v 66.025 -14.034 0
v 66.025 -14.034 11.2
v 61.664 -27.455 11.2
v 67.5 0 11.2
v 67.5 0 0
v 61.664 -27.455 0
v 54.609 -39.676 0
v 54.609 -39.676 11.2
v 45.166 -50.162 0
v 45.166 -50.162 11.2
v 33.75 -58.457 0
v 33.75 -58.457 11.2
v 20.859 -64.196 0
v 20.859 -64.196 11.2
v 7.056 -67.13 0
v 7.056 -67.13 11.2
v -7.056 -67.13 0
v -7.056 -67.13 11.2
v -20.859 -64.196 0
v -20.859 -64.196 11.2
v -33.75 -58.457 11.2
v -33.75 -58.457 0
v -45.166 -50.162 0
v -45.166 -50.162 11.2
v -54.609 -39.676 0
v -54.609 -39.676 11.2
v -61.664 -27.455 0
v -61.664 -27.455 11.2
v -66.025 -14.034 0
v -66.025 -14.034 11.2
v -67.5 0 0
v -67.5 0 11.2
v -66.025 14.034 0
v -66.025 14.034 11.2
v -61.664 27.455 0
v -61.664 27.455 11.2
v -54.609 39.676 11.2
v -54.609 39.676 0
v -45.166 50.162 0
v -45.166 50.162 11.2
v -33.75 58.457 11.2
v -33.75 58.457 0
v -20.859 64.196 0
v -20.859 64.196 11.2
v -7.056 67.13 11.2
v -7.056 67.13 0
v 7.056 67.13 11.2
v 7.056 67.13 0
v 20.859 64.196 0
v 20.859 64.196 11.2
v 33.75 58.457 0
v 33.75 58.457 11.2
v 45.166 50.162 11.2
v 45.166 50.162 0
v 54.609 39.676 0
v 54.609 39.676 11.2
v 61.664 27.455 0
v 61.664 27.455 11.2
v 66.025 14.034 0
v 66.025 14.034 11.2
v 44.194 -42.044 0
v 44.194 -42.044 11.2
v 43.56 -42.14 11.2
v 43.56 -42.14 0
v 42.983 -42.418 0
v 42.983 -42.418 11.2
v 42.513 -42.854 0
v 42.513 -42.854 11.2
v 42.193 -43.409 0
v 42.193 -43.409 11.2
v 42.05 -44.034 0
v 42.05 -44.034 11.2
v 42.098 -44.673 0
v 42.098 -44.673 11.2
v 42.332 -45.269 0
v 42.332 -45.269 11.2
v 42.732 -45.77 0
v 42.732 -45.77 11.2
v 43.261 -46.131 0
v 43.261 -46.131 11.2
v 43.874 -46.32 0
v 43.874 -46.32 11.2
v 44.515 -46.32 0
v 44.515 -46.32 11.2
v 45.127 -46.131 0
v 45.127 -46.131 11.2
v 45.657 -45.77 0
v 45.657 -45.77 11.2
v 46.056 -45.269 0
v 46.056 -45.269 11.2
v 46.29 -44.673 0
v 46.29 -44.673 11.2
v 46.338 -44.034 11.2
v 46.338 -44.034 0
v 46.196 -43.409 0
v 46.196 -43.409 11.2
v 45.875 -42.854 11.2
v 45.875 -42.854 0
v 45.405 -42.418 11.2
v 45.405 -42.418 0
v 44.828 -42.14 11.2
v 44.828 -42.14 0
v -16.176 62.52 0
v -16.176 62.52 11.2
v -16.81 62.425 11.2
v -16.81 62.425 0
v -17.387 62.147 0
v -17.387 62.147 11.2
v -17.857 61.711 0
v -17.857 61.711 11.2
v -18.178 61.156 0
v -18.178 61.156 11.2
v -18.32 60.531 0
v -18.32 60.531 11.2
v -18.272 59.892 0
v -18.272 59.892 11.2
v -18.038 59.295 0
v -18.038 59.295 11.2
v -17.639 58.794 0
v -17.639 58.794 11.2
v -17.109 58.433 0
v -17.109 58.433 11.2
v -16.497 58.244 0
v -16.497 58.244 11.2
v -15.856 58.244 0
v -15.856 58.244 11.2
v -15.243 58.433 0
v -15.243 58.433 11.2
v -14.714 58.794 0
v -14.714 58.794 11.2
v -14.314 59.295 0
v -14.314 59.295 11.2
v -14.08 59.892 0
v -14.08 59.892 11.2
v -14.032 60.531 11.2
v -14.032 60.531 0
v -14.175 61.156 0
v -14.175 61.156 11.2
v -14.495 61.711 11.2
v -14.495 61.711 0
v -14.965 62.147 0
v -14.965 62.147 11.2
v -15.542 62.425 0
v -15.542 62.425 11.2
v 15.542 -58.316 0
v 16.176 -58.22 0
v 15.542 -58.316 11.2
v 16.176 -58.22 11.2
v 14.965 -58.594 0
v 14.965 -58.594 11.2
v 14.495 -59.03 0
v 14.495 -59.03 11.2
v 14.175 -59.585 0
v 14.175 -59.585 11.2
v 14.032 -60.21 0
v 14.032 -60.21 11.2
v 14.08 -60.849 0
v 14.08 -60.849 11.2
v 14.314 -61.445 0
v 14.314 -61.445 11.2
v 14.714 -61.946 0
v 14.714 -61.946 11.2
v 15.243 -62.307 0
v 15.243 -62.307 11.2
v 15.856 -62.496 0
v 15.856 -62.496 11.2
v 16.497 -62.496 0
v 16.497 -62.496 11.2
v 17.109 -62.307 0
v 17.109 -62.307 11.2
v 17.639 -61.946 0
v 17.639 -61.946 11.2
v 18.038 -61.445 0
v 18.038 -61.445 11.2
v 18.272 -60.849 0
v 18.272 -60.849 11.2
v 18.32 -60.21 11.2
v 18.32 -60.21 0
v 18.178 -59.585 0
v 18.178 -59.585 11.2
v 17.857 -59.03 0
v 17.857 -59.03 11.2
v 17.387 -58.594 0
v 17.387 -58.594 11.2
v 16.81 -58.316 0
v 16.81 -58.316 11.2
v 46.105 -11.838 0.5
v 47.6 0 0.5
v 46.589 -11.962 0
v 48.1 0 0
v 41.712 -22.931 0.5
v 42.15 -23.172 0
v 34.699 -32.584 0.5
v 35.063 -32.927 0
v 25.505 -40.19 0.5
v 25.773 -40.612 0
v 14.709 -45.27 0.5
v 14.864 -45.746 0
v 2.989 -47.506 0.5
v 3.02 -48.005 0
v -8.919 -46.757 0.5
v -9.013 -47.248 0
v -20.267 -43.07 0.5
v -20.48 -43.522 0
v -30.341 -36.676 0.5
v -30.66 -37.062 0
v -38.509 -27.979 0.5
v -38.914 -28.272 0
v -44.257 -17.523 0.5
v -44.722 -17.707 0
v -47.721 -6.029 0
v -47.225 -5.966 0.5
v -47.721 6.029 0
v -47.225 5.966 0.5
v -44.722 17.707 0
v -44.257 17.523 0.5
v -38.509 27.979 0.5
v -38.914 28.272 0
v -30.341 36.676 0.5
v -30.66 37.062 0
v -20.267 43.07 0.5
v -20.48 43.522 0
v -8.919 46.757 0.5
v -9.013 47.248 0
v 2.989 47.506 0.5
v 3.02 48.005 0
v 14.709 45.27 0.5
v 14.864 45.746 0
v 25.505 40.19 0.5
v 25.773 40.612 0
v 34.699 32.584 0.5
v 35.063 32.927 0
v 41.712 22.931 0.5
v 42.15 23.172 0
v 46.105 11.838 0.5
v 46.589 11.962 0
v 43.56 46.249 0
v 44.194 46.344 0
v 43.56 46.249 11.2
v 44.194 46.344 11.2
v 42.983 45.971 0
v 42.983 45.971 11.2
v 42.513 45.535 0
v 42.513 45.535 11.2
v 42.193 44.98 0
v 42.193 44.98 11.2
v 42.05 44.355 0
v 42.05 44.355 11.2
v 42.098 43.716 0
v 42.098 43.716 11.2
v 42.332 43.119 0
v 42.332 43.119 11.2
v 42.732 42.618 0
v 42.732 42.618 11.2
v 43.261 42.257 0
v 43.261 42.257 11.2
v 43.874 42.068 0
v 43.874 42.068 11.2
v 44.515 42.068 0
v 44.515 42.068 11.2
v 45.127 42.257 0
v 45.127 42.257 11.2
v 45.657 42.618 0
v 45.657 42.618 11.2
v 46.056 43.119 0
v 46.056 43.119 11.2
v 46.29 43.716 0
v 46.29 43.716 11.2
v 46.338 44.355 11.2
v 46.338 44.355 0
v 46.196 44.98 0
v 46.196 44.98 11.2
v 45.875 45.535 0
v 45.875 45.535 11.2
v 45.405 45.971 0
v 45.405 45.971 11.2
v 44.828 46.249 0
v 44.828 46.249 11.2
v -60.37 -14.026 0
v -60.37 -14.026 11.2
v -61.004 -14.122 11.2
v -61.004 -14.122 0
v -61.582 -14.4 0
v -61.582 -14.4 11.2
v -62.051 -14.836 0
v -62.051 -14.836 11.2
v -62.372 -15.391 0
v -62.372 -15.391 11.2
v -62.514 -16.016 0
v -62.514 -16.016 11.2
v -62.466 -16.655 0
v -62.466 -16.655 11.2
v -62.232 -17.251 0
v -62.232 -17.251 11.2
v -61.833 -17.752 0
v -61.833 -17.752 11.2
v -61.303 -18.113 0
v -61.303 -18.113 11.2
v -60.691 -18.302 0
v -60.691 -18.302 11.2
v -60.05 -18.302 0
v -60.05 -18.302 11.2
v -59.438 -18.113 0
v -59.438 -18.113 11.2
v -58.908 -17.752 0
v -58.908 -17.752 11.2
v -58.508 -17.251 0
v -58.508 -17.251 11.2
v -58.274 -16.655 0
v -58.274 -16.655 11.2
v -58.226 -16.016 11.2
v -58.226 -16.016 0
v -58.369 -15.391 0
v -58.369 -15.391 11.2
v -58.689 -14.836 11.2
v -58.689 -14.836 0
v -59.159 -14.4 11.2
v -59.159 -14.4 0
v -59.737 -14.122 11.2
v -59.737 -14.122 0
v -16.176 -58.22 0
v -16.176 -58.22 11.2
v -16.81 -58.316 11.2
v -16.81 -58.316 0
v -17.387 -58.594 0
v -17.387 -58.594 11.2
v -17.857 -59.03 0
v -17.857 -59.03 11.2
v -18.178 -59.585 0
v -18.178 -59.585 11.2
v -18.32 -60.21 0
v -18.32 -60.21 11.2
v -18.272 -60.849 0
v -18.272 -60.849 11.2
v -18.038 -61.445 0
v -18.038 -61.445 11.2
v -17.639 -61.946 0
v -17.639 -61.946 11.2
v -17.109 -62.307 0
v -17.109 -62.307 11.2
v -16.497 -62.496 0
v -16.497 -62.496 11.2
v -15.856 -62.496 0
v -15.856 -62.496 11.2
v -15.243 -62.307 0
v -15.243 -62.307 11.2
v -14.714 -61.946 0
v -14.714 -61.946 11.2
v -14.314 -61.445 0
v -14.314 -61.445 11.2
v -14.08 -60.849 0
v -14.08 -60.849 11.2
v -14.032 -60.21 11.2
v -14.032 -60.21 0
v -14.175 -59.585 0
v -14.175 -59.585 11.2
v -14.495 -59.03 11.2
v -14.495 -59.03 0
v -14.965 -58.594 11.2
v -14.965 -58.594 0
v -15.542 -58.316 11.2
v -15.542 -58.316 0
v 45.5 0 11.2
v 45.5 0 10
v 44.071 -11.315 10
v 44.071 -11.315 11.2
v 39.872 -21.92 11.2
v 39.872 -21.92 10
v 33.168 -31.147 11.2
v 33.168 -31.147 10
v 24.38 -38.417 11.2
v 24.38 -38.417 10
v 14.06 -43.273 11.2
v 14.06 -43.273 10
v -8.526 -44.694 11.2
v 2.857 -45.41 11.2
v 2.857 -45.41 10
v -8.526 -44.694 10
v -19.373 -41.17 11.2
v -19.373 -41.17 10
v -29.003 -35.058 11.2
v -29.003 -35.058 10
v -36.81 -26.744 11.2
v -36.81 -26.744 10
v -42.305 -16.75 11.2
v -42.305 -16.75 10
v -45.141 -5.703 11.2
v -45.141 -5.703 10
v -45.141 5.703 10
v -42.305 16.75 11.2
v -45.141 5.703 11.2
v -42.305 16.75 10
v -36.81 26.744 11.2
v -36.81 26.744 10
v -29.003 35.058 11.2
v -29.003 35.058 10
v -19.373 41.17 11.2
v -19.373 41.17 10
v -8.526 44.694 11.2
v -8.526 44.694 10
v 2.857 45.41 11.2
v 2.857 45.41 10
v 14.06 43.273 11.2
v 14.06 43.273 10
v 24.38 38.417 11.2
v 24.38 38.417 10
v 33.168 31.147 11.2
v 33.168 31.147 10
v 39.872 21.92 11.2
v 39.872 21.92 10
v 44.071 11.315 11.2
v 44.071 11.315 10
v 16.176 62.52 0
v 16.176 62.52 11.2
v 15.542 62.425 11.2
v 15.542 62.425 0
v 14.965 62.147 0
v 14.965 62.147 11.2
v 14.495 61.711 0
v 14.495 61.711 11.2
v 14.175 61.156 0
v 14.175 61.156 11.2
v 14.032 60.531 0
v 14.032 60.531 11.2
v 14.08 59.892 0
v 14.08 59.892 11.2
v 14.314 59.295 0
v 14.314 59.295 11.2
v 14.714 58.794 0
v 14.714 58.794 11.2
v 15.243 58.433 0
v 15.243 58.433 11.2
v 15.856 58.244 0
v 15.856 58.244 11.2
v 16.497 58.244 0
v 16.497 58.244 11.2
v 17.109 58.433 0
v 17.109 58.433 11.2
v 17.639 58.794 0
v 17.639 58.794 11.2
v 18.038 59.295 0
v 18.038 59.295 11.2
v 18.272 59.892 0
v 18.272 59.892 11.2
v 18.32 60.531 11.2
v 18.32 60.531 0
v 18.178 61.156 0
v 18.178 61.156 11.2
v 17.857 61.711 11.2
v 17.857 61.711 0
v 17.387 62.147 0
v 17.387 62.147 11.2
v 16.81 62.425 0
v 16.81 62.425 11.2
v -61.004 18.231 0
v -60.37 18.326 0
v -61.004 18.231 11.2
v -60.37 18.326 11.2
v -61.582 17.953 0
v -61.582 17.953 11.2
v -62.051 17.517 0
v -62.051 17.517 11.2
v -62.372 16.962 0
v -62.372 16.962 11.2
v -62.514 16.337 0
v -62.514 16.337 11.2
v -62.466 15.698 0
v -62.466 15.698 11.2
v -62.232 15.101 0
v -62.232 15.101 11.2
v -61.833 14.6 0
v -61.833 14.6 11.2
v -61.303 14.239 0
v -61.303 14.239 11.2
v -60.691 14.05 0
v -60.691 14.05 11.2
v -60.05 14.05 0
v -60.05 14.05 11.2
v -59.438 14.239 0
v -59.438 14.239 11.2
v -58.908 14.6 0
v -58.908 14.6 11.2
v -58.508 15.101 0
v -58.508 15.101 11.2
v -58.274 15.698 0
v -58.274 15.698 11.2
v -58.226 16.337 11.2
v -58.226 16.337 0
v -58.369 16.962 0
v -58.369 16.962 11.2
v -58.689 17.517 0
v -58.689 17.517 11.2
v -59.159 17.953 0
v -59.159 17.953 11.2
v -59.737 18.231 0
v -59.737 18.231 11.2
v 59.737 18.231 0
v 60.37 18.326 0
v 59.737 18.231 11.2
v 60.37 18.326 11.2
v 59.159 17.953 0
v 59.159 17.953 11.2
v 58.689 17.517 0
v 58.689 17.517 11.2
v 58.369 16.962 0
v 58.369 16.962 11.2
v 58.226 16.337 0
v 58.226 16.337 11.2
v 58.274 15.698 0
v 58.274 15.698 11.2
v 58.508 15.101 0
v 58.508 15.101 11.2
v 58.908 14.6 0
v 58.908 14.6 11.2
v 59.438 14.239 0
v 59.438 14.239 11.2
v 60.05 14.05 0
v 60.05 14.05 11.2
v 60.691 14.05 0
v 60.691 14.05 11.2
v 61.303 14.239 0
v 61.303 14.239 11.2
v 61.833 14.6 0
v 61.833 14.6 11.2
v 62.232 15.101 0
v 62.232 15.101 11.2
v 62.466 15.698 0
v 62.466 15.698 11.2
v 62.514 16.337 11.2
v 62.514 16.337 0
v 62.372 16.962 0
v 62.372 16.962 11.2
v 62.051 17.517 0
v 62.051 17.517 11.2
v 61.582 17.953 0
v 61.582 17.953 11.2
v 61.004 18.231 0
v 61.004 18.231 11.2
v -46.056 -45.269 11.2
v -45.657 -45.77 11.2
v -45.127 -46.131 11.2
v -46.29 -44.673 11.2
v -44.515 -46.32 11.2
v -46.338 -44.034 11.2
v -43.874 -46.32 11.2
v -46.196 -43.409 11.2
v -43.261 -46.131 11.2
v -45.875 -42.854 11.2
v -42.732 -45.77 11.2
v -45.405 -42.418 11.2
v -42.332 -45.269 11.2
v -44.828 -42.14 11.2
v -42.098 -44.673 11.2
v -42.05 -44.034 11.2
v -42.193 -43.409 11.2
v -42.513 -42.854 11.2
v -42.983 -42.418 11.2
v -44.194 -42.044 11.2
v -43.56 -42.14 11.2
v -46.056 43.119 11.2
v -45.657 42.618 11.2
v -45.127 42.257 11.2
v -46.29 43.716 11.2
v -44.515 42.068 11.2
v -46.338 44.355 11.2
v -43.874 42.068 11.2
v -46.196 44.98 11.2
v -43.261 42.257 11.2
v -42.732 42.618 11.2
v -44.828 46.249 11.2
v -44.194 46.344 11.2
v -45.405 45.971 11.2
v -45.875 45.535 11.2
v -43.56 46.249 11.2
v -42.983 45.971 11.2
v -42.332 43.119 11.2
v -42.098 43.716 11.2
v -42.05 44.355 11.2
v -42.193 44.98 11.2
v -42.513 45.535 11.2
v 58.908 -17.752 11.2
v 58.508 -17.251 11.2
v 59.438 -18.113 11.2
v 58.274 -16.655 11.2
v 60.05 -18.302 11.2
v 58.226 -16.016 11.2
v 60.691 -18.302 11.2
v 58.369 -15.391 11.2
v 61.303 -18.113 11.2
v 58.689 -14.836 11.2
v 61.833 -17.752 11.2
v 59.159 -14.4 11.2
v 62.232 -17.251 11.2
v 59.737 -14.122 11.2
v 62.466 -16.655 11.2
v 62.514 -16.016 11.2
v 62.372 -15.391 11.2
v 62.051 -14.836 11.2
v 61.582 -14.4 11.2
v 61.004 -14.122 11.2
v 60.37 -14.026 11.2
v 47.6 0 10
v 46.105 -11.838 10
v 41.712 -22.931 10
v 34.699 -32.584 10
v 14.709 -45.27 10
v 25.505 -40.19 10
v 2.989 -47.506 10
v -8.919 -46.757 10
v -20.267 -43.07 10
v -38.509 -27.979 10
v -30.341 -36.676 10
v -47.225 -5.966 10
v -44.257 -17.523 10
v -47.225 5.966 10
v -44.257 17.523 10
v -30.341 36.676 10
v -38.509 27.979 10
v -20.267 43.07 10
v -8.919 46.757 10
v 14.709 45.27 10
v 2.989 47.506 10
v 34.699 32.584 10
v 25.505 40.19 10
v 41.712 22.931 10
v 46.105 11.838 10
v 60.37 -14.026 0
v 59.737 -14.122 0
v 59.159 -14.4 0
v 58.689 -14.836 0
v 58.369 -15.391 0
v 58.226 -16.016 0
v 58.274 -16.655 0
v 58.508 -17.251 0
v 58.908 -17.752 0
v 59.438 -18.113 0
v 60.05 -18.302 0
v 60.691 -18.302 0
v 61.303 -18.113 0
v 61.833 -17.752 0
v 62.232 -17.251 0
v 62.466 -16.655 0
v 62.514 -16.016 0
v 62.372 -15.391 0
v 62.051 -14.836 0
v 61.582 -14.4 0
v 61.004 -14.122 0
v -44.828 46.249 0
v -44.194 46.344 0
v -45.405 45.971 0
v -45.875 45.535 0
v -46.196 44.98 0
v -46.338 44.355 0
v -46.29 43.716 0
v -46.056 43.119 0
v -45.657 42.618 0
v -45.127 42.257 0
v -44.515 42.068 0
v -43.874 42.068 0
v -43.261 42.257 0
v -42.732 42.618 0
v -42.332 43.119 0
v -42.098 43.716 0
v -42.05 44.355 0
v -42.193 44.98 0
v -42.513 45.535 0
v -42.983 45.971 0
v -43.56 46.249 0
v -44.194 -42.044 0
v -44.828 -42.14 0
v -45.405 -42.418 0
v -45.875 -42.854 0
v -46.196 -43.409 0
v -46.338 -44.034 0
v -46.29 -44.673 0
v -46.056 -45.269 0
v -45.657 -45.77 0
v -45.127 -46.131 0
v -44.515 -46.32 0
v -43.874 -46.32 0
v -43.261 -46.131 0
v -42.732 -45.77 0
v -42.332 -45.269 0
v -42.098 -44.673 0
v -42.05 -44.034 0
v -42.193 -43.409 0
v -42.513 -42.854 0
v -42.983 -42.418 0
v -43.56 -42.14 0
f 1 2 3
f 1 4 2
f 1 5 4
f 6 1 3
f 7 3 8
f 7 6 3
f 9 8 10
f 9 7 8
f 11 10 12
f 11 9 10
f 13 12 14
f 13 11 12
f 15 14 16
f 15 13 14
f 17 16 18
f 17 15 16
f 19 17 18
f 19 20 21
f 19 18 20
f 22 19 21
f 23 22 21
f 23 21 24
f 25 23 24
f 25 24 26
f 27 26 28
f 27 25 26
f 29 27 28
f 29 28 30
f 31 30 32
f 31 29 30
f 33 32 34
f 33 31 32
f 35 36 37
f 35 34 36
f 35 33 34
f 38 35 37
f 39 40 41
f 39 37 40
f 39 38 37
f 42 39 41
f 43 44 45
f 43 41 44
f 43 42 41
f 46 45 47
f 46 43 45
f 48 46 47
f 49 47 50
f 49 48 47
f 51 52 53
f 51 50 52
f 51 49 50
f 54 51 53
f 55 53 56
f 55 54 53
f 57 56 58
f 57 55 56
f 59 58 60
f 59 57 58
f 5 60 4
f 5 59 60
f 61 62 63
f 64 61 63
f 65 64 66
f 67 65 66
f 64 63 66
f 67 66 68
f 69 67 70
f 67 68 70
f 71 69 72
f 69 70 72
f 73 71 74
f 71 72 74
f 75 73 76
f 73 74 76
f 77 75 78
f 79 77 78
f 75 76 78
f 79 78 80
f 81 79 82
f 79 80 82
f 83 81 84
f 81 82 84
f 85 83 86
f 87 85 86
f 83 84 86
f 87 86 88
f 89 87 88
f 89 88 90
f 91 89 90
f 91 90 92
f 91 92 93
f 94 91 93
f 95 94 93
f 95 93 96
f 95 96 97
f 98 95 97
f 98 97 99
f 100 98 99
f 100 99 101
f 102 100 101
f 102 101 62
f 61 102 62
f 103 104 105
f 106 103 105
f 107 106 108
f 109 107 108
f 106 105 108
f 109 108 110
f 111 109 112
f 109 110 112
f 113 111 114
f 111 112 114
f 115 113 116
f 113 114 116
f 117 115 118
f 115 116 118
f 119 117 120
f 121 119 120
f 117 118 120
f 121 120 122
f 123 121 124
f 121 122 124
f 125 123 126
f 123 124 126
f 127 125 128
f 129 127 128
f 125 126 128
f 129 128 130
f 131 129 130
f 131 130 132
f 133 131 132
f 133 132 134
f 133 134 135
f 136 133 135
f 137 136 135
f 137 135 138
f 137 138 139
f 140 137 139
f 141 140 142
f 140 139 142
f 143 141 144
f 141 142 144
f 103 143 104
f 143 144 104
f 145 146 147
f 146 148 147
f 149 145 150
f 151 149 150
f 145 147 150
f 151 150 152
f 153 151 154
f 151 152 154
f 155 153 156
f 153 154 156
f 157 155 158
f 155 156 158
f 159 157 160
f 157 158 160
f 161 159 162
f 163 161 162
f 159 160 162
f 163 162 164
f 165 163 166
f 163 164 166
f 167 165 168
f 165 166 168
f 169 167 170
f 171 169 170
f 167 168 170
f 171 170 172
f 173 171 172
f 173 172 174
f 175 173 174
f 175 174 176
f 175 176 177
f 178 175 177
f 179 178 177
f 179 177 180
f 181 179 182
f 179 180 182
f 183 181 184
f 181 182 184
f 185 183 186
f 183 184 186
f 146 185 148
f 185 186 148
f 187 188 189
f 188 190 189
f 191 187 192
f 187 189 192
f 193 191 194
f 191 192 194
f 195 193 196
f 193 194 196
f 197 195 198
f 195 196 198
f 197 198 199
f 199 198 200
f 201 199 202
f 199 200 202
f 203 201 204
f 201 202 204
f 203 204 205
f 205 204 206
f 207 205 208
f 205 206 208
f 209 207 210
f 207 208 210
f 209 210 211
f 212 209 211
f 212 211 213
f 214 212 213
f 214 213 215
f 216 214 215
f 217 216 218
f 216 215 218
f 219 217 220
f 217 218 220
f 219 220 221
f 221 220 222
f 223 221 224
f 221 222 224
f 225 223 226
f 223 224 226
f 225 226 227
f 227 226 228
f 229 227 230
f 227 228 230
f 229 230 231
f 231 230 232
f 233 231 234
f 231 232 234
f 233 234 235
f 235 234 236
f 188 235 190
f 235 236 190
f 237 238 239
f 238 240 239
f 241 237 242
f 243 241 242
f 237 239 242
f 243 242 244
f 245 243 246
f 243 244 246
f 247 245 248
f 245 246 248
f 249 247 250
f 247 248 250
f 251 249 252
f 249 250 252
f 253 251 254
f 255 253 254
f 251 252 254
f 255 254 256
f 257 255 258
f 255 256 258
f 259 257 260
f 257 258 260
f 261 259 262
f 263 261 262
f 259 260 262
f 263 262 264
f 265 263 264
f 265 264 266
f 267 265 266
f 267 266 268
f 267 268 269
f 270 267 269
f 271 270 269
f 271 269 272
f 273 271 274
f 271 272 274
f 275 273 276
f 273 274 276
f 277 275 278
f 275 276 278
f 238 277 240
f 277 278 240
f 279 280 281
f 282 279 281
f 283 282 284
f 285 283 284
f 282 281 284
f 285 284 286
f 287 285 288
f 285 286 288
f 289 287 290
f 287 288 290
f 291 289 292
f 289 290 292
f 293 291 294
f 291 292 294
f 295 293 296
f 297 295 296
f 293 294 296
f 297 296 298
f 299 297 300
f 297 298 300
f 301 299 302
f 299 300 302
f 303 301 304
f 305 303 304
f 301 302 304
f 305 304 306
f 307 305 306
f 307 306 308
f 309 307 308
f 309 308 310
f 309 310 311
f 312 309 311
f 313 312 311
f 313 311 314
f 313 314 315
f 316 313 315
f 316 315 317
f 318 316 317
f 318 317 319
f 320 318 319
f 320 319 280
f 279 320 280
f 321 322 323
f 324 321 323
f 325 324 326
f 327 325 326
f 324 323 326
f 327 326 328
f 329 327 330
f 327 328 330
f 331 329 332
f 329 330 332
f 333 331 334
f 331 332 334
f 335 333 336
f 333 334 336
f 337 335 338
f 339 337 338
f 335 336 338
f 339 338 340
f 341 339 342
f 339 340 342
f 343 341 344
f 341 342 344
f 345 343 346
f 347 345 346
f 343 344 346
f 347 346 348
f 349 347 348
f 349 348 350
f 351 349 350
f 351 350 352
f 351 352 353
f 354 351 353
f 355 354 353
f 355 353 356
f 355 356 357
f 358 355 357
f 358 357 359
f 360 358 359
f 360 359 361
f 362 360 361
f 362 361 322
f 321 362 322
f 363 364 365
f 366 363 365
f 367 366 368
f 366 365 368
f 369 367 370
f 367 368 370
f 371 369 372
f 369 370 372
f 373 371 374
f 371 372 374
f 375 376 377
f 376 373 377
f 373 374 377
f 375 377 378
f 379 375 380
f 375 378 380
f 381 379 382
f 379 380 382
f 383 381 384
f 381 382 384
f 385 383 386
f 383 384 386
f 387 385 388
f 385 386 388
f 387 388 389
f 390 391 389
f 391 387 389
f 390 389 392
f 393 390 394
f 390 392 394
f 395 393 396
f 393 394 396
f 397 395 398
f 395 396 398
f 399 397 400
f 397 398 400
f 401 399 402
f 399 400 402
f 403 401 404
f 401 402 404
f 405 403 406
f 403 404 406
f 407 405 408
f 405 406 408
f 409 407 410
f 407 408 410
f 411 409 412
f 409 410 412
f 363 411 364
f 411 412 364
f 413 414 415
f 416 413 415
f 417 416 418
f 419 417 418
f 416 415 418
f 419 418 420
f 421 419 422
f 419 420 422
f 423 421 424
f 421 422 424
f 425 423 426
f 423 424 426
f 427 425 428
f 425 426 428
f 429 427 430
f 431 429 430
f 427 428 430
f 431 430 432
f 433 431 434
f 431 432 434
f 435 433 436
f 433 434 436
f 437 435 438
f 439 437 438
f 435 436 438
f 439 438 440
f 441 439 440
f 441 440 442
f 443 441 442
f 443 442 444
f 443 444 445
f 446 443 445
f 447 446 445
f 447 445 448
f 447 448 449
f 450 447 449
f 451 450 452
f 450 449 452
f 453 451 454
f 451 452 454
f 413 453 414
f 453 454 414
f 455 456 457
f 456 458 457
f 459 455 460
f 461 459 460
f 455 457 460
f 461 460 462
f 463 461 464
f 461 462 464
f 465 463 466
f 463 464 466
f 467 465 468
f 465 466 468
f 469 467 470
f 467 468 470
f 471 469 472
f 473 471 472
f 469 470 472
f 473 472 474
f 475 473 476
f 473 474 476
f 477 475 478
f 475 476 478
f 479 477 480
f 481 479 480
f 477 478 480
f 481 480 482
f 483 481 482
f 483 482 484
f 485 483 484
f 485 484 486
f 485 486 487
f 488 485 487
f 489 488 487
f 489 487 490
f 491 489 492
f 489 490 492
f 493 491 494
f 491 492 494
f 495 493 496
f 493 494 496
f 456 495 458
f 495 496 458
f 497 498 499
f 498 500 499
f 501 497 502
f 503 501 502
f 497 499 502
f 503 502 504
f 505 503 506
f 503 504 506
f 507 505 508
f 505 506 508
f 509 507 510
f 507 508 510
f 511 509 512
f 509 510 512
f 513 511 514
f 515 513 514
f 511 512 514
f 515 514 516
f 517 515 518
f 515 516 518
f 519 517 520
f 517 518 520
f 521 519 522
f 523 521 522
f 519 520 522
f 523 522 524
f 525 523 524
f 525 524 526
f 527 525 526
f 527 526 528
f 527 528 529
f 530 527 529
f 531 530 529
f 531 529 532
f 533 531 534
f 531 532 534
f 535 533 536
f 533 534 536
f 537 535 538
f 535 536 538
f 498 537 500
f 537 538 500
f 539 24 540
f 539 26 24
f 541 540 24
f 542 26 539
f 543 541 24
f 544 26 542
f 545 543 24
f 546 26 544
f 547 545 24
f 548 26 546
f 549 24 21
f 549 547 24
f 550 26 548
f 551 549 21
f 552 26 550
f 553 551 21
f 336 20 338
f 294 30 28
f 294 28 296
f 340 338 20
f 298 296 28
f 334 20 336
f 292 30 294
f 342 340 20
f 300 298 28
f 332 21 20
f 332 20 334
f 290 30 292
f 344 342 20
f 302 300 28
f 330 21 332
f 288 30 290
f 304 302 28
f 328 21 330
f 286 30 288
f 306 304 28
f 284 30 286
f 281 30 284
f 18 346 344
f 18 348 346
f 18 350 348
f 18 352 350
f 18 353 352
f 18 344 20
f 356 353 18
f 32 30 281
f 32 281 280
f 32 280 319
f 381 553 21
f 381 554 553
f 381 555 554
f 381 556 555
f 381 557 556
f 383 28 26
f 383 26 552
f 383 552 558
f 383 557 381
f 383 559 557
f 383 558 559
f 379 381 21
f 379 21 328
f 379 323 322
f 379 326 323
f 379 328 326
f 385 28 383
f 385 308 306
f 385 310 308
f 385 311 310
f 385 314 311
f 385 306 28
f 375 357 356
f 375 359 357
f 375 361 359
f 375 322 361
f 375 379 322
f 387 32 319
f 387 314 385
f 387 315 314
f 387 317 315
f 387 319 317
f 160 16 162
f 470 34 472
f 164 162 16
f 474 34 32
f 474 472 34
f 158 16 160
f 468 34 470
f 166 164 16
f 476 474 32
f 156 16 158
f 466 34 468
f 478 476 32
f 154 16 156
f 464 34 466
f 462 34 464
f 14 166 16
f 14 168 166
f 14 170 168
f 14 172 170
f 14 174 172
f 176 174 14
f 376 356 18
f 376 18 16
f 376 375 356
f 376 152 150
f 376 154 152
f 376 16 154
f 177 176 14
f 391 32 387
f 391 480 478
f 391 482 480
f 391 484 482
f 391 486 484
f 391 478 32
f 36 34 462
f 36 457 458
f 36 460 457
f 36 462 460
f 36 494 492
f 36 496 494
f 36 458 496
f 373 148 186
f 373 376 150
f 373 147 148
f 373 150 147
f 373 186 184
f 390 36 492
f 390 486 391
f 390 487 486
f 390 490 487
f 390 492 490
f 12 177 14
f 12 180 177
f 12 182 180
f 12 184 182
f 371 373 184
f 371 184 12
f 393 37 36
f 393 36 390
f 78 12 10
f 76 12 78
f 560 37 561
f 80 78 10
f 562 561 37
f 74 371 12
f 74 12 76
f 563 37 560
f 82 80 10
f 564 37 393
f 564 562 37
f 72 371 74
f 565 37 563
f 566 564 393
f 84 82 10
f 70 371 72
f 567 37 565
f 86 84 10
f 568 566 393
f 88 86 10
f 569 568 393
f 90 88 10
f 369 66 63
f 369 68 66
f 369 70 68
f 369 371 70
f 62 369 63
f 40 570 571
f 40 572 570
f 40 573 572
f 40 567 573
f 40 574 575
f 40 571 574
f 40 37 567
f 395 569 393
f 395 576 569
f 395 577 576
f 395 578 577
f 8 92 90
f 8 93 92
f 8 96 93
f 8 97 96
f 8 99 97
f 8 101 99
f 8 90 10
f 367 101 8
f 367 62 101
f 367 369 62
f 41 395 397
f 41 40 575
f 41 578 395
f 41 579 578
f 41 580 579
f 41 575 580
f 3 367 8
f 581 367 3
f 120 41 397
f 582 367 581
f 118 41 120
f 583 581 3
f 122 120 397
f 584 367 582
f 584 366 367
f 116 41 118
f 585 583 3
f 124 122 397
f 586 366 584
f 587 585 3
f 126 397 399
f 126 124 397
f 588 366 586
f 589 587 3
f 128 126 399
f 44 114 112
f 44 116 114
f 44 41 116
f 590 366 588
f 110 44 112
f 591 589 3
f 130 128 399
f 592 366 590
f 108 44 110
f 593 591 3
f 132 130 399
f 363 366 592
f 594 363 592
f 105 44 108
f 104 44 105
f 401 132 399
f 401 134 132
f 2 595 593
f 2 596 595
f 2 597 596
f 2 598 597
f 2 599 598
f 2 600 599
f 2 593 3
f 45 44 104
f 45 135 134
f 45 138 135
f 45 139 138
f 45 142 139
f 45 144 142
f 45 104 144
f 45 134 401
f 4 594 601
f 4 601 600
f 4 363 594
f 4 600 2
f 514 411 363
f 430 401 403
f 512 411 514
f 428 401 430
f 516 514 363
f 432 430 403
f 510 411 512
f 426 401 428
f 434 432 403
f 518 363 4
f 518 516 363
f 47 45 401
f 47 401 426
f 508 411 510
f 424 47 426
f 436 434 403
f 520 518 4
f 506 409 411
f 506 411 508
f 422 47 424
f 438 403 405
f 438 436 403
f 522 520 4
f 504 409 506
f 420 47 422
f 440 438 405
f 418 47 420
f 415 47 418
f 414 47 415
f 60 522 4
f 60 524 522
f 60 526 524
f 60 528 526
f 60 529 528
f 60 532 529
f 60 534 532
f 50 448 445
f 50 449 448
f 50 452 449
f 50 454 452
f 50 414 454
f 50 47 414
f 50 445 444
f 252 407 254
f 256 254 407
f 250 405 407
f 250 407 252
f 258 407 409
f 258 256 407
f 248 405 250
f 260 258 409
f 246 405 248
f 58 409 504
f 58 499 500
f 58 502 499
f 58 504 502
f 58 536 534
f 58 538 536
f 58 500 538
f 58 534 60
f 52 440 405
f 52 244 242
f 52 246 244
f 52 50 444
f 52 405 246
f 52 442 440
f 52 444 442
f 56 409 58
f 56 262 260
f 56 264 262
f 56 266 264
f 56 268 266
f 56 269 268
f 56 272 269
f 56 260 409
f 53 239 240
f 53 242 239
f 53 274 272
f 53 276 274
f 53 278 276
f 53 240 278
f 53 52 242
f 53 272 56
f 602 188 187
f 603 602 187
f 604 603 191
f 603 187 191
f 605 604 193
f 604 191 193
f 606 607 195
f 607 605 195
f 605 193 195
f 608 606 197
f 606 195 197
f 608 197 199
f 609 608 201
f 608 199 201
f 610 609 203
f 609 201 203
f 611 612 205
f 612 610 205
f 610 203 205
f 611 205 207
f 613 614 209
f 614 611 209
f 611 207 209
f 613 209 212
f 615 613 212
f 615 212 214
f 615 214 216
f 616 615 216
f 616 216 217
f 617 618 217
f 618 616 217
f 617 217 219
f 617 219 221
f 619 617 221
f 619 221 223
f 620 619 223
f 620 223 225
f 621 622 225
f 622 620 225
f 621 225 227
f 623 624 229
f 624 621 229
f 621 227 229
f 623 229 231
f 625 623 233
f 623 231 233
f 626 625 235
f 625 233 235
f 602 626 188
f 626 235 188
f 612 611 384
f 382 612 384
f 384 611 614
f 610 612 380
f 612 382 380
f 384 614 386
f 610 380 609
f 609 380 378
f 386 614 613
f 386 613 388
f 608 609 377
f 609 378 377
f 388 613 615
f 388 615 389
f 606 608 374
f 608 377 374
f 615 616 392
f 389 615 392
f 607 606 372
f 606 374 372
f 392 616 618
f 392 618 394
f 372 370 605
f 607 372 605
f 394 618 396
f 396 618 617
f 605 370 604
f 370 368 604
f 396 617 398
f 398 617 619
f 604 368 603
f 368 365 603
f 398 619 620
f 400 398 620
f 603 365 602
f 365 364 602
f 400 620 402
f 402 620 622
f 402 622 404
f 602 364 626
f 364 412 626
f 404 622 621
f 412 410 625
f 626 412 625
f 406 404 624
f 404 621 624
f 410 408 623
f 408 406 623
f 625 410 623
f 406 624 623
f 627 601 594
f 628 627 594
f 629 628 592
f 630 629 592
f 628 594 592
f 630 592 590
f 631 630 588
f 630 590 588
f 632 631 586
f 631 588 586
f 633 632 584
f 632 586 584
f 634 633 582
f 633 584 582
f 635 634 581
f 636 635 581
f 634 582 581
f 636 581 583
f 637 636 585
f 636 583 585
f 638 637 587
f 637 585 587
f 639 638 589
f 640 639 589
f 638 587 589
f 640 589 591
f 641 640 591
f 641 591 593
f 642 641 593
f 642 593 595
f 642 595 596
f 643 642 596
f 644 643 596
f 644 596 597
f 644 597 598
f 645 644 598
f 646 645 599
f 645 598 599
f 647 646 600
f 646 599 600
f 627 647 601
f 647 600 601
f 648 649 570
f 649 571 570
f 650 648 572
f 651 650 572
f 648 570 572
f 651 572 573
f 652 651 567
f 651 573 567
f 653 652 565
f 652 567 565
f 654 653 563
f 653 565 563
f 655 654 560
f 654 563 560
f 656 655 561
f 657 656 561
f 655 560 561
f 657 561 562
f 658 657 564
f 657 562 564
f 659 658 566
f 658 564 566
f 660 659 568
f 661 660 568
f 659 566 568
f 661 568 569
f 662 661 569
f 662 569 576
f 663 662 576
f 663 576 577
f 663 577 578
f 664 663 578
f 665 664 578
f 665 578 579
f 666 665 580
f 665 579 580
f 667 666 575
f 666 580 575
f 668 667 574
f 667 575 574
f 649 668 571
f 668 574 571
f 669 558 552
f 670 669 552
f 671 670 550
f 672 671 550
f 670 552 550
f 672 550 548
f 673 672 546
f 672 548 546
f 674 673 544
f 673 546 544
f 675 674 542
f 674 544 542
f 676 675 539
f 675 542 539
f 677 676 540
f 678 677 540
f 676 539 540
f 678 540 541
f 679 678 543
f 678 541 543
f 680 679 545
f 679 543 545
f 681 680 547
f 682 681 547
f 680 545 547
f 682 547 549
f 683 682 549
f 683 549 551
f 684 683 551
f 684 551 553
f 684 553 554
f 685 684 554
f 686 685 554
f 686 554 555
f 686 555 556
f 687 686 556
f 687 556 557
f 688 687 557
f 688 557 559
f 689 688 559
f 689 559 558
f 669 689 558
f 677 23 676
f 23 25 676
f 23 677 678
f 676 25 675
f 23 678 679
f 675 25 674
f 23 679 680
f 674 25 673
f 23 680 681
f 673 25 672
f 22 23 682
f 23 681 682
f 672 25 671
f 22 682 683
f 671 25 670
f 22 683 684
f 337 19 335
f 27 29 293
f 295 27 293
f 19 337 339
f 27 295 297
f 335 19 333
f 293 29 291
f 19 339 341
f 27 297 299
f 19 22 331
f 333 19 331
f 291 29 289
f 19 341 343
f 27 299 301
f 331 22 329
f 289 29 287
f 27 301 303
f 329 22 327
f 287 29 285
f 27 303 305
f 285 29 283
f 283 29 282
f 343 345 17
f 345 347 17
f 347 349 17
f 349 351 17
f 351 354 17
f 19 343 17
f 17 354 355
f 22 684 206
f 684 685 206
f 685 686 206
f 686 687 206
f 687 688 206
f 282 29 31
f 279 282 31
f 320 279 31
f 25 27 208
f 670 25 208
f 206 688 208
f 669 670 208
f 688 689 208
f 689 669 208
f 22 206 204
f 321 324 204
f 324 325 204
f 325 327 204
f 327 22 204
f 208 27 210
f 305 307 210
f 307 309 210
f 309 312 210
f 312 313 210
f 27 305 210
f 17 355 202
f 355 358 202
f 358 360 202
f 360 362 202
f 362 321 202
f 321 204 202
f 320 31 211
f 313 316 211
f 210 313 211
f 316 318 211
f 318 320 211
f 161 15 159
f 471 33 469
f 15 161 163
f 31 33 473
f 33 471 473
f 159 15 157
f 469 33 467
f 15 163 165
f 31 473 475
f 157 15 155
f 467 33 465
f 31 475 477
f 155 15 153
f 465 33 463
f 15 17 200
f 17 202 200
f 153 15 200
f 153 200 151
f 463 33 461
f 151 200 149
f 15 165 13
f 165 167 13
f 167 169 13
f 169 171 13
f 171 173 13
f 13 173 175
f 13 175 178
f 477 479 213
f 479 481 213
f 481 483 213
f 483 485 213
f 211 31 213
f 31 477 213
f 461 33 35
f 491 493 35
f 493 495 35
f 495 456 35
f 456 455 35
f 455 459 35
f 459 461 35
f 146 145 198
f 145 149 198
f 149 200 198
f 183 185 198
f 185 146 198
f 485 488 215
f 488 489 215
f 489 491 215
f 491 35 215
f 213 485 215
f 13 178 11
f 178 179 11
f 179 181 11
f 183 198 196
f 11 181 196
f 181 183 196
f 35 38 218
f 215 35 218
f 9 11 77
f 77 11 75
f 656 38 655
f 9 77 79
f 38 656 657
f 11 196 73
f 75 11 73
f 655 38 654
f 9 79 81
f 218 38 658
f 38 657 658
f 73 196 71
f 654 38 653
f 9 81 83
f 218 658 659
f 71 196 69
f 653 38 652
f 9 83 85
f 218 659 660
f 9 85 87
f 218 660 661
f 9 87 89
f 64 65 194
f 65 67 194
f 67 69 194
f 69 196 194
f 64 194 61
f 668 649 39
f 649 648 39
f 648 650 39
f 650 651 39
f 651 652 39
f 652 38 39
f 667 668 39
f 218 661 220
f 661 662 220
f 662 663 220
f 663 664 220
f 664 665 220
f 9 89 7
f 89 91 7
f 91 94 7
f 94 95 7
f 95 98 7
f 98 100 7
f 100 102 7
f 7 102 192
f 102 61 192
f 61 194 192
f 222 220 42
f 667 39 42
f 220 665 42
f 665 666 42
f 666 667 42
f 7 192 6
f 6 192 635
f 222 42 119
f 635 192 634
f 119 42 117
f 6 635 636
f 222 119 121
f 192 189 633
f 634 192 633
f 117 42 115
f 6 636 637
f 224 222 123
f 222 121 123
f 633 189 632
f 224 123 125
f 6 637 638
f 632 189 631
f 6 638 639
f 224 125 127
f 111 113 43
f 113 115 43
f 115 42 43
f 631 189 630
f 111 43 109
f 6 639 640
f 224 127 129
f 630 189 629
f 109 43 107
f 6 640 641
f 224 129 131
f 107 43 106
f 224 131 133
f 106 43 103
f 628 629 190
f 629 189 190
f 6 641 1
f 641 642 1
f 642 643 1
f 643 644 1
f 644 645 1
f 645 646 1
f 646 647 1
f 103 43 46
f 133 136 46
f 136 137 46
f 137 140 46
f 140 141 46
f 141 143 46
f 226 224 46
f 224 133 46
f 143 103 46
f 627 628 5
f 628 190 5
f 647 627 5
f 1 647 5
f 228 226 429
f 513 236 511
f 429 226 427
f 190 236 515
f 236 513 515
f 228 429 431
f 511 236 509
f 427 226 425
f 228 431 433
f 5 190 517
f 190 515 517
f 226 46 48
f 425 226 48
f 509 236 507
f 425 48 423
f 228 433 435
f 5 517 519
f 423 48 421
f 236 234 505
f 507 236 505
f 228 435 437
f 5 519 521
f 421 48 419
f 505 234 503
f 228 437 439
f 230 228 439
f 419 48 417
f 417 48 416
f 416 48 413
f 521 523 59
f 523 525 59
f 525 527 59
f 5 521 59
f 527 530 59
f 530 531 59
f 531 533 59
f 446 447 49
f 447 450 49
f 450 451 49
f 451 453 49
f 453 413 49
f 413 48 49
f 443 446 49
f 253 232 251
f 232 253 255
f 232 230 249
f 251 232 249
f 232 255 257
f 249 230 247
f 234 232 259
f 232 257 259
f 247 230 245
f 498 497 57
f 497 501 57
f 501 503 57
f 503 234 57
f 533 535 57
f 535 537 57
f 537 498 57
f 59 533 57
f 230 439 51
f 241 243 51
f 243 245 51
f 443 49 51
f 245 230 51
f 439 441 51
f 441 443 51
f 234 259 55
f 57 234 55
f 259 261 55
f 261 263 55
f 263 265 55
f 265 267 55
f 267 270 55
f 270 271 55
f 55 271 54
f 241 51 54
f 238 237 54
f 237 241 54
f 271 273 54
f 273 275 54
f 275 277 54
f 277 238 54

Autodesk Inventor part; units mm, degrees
ref_plane "YZ Plane" through (0, 0, 0) normal (1, 0, 0) x (0, 1, 0)
ref_plane "XZ Plane" through (0, 0, 0) normal (0, 1, 0) x (-1, 0, 0)
ref_plane "XY Plane" through (0, 0, 0) normal (0, 0, 1) x (1, 0, 0)
sketch "スケッチ1" plane through (0, 0, 0) normal (0, 0, 1) x (1, 0, 0)
  circle A0 centre (0, 0) radius 47.6
  circle A1 centre (0, 0) radius 67.5
  dimension "d0" = 95.2
  dimension "d1" = 135
extrude "押し出し1" add sketch "スケッチ1" along normal blind 10
sketch "スケッチ5" plane through (0, 0, 10) normal (0, 0, 1) x (1, 0, 0)
  circle A0 centre (0, 0) radius 67.5 projected
  circle A1 centre (0, 0) radius 47.6 projected
  circle A2 centre (0, 0) radius 45.5
  dimension "d29" = 91
extrude "押し出し4" add sketch "スケッチ5" along normal blind 1.2 contours A0 | A1
sketch "スケッチ2" plane through (0, 0, 0) normal (0, 0, 1) x (1, 0, 0)
  circle A0 centre (0, 0) radius 62.5
  point P0 (16.1762, 60.3704)
  point P1 (-16.1762, 60.3704)
  point P2 (-44.1942, 44.1942)
  point P3 (-60.3704, 16.1762)
  point P4 (-60.3704, -16.1762)
  point P5 (-44.1942, -44.1942)
  point P6 (-16.1762, -60.3704)
  point P7 (16.1762, -60.3704)
  point P8 (44.1942, -44.1942)
  point P9 (60.3704, -16.1762)
  point P10 (60.3704, 16.1762)
  point P11 (44.1942, 44.1942)
  dimension "d4" = 125
  dimension "d7" = 360
  dimension "d25" = 0
hole "穴1" at (16.1762, 60.3704, 0) at (-16.1762, 60.3704, 0) at (-44.1942, 44.1942, 0) at (-60.3704, 16.1762, 0) at (-60.3704, -16.1762, 0) at (-44.1942, -44.1942, 0) at (-16.1762, -60.3704, 0) at (16.1762, -60.3704, 0) at (44.1942, -44.1942, 0) at (60.3704, -16.1762, 0) at (60.3704, 16.1762, 0) at (44.1942, 44.1942, 0) direction (0, 0, 1) diameter 4.3 end through all clearance for "Flat Head Machine Screw" size "M4" standard "Ansi Metric M Profile"
chamfer "面取り2" distance 0.5 angle 45 1 edges at (-47.6, 0, 0)
sketch "スケッチ3" plane through (0, 0, 10) normal (0, 0, 1) x (1, 0, 0)
  circle A0 centre (16.1762, 60.3704) radius 2.15 projected
  circle A1 centre (-16.1762, 60.3704) radius 2.15 projected
  circle A2 centre (0, 0) radius 67.5 projected
  circle A3 centre (0, 0) radius 62.5
  circle A4 centre (-16.1762, 60.3704) radius 5
  circle A5 centre (16.1762, 60.3704) radius 5
  point P0 (11.2987, 61.4702)
  point P1 (17.4703, 65.2)
  point P2 (-17.4703, 65.2)
  point P3 (-20.9502, 58.8841)
properties part number "scara-base3" material "ABS プラスチック"
